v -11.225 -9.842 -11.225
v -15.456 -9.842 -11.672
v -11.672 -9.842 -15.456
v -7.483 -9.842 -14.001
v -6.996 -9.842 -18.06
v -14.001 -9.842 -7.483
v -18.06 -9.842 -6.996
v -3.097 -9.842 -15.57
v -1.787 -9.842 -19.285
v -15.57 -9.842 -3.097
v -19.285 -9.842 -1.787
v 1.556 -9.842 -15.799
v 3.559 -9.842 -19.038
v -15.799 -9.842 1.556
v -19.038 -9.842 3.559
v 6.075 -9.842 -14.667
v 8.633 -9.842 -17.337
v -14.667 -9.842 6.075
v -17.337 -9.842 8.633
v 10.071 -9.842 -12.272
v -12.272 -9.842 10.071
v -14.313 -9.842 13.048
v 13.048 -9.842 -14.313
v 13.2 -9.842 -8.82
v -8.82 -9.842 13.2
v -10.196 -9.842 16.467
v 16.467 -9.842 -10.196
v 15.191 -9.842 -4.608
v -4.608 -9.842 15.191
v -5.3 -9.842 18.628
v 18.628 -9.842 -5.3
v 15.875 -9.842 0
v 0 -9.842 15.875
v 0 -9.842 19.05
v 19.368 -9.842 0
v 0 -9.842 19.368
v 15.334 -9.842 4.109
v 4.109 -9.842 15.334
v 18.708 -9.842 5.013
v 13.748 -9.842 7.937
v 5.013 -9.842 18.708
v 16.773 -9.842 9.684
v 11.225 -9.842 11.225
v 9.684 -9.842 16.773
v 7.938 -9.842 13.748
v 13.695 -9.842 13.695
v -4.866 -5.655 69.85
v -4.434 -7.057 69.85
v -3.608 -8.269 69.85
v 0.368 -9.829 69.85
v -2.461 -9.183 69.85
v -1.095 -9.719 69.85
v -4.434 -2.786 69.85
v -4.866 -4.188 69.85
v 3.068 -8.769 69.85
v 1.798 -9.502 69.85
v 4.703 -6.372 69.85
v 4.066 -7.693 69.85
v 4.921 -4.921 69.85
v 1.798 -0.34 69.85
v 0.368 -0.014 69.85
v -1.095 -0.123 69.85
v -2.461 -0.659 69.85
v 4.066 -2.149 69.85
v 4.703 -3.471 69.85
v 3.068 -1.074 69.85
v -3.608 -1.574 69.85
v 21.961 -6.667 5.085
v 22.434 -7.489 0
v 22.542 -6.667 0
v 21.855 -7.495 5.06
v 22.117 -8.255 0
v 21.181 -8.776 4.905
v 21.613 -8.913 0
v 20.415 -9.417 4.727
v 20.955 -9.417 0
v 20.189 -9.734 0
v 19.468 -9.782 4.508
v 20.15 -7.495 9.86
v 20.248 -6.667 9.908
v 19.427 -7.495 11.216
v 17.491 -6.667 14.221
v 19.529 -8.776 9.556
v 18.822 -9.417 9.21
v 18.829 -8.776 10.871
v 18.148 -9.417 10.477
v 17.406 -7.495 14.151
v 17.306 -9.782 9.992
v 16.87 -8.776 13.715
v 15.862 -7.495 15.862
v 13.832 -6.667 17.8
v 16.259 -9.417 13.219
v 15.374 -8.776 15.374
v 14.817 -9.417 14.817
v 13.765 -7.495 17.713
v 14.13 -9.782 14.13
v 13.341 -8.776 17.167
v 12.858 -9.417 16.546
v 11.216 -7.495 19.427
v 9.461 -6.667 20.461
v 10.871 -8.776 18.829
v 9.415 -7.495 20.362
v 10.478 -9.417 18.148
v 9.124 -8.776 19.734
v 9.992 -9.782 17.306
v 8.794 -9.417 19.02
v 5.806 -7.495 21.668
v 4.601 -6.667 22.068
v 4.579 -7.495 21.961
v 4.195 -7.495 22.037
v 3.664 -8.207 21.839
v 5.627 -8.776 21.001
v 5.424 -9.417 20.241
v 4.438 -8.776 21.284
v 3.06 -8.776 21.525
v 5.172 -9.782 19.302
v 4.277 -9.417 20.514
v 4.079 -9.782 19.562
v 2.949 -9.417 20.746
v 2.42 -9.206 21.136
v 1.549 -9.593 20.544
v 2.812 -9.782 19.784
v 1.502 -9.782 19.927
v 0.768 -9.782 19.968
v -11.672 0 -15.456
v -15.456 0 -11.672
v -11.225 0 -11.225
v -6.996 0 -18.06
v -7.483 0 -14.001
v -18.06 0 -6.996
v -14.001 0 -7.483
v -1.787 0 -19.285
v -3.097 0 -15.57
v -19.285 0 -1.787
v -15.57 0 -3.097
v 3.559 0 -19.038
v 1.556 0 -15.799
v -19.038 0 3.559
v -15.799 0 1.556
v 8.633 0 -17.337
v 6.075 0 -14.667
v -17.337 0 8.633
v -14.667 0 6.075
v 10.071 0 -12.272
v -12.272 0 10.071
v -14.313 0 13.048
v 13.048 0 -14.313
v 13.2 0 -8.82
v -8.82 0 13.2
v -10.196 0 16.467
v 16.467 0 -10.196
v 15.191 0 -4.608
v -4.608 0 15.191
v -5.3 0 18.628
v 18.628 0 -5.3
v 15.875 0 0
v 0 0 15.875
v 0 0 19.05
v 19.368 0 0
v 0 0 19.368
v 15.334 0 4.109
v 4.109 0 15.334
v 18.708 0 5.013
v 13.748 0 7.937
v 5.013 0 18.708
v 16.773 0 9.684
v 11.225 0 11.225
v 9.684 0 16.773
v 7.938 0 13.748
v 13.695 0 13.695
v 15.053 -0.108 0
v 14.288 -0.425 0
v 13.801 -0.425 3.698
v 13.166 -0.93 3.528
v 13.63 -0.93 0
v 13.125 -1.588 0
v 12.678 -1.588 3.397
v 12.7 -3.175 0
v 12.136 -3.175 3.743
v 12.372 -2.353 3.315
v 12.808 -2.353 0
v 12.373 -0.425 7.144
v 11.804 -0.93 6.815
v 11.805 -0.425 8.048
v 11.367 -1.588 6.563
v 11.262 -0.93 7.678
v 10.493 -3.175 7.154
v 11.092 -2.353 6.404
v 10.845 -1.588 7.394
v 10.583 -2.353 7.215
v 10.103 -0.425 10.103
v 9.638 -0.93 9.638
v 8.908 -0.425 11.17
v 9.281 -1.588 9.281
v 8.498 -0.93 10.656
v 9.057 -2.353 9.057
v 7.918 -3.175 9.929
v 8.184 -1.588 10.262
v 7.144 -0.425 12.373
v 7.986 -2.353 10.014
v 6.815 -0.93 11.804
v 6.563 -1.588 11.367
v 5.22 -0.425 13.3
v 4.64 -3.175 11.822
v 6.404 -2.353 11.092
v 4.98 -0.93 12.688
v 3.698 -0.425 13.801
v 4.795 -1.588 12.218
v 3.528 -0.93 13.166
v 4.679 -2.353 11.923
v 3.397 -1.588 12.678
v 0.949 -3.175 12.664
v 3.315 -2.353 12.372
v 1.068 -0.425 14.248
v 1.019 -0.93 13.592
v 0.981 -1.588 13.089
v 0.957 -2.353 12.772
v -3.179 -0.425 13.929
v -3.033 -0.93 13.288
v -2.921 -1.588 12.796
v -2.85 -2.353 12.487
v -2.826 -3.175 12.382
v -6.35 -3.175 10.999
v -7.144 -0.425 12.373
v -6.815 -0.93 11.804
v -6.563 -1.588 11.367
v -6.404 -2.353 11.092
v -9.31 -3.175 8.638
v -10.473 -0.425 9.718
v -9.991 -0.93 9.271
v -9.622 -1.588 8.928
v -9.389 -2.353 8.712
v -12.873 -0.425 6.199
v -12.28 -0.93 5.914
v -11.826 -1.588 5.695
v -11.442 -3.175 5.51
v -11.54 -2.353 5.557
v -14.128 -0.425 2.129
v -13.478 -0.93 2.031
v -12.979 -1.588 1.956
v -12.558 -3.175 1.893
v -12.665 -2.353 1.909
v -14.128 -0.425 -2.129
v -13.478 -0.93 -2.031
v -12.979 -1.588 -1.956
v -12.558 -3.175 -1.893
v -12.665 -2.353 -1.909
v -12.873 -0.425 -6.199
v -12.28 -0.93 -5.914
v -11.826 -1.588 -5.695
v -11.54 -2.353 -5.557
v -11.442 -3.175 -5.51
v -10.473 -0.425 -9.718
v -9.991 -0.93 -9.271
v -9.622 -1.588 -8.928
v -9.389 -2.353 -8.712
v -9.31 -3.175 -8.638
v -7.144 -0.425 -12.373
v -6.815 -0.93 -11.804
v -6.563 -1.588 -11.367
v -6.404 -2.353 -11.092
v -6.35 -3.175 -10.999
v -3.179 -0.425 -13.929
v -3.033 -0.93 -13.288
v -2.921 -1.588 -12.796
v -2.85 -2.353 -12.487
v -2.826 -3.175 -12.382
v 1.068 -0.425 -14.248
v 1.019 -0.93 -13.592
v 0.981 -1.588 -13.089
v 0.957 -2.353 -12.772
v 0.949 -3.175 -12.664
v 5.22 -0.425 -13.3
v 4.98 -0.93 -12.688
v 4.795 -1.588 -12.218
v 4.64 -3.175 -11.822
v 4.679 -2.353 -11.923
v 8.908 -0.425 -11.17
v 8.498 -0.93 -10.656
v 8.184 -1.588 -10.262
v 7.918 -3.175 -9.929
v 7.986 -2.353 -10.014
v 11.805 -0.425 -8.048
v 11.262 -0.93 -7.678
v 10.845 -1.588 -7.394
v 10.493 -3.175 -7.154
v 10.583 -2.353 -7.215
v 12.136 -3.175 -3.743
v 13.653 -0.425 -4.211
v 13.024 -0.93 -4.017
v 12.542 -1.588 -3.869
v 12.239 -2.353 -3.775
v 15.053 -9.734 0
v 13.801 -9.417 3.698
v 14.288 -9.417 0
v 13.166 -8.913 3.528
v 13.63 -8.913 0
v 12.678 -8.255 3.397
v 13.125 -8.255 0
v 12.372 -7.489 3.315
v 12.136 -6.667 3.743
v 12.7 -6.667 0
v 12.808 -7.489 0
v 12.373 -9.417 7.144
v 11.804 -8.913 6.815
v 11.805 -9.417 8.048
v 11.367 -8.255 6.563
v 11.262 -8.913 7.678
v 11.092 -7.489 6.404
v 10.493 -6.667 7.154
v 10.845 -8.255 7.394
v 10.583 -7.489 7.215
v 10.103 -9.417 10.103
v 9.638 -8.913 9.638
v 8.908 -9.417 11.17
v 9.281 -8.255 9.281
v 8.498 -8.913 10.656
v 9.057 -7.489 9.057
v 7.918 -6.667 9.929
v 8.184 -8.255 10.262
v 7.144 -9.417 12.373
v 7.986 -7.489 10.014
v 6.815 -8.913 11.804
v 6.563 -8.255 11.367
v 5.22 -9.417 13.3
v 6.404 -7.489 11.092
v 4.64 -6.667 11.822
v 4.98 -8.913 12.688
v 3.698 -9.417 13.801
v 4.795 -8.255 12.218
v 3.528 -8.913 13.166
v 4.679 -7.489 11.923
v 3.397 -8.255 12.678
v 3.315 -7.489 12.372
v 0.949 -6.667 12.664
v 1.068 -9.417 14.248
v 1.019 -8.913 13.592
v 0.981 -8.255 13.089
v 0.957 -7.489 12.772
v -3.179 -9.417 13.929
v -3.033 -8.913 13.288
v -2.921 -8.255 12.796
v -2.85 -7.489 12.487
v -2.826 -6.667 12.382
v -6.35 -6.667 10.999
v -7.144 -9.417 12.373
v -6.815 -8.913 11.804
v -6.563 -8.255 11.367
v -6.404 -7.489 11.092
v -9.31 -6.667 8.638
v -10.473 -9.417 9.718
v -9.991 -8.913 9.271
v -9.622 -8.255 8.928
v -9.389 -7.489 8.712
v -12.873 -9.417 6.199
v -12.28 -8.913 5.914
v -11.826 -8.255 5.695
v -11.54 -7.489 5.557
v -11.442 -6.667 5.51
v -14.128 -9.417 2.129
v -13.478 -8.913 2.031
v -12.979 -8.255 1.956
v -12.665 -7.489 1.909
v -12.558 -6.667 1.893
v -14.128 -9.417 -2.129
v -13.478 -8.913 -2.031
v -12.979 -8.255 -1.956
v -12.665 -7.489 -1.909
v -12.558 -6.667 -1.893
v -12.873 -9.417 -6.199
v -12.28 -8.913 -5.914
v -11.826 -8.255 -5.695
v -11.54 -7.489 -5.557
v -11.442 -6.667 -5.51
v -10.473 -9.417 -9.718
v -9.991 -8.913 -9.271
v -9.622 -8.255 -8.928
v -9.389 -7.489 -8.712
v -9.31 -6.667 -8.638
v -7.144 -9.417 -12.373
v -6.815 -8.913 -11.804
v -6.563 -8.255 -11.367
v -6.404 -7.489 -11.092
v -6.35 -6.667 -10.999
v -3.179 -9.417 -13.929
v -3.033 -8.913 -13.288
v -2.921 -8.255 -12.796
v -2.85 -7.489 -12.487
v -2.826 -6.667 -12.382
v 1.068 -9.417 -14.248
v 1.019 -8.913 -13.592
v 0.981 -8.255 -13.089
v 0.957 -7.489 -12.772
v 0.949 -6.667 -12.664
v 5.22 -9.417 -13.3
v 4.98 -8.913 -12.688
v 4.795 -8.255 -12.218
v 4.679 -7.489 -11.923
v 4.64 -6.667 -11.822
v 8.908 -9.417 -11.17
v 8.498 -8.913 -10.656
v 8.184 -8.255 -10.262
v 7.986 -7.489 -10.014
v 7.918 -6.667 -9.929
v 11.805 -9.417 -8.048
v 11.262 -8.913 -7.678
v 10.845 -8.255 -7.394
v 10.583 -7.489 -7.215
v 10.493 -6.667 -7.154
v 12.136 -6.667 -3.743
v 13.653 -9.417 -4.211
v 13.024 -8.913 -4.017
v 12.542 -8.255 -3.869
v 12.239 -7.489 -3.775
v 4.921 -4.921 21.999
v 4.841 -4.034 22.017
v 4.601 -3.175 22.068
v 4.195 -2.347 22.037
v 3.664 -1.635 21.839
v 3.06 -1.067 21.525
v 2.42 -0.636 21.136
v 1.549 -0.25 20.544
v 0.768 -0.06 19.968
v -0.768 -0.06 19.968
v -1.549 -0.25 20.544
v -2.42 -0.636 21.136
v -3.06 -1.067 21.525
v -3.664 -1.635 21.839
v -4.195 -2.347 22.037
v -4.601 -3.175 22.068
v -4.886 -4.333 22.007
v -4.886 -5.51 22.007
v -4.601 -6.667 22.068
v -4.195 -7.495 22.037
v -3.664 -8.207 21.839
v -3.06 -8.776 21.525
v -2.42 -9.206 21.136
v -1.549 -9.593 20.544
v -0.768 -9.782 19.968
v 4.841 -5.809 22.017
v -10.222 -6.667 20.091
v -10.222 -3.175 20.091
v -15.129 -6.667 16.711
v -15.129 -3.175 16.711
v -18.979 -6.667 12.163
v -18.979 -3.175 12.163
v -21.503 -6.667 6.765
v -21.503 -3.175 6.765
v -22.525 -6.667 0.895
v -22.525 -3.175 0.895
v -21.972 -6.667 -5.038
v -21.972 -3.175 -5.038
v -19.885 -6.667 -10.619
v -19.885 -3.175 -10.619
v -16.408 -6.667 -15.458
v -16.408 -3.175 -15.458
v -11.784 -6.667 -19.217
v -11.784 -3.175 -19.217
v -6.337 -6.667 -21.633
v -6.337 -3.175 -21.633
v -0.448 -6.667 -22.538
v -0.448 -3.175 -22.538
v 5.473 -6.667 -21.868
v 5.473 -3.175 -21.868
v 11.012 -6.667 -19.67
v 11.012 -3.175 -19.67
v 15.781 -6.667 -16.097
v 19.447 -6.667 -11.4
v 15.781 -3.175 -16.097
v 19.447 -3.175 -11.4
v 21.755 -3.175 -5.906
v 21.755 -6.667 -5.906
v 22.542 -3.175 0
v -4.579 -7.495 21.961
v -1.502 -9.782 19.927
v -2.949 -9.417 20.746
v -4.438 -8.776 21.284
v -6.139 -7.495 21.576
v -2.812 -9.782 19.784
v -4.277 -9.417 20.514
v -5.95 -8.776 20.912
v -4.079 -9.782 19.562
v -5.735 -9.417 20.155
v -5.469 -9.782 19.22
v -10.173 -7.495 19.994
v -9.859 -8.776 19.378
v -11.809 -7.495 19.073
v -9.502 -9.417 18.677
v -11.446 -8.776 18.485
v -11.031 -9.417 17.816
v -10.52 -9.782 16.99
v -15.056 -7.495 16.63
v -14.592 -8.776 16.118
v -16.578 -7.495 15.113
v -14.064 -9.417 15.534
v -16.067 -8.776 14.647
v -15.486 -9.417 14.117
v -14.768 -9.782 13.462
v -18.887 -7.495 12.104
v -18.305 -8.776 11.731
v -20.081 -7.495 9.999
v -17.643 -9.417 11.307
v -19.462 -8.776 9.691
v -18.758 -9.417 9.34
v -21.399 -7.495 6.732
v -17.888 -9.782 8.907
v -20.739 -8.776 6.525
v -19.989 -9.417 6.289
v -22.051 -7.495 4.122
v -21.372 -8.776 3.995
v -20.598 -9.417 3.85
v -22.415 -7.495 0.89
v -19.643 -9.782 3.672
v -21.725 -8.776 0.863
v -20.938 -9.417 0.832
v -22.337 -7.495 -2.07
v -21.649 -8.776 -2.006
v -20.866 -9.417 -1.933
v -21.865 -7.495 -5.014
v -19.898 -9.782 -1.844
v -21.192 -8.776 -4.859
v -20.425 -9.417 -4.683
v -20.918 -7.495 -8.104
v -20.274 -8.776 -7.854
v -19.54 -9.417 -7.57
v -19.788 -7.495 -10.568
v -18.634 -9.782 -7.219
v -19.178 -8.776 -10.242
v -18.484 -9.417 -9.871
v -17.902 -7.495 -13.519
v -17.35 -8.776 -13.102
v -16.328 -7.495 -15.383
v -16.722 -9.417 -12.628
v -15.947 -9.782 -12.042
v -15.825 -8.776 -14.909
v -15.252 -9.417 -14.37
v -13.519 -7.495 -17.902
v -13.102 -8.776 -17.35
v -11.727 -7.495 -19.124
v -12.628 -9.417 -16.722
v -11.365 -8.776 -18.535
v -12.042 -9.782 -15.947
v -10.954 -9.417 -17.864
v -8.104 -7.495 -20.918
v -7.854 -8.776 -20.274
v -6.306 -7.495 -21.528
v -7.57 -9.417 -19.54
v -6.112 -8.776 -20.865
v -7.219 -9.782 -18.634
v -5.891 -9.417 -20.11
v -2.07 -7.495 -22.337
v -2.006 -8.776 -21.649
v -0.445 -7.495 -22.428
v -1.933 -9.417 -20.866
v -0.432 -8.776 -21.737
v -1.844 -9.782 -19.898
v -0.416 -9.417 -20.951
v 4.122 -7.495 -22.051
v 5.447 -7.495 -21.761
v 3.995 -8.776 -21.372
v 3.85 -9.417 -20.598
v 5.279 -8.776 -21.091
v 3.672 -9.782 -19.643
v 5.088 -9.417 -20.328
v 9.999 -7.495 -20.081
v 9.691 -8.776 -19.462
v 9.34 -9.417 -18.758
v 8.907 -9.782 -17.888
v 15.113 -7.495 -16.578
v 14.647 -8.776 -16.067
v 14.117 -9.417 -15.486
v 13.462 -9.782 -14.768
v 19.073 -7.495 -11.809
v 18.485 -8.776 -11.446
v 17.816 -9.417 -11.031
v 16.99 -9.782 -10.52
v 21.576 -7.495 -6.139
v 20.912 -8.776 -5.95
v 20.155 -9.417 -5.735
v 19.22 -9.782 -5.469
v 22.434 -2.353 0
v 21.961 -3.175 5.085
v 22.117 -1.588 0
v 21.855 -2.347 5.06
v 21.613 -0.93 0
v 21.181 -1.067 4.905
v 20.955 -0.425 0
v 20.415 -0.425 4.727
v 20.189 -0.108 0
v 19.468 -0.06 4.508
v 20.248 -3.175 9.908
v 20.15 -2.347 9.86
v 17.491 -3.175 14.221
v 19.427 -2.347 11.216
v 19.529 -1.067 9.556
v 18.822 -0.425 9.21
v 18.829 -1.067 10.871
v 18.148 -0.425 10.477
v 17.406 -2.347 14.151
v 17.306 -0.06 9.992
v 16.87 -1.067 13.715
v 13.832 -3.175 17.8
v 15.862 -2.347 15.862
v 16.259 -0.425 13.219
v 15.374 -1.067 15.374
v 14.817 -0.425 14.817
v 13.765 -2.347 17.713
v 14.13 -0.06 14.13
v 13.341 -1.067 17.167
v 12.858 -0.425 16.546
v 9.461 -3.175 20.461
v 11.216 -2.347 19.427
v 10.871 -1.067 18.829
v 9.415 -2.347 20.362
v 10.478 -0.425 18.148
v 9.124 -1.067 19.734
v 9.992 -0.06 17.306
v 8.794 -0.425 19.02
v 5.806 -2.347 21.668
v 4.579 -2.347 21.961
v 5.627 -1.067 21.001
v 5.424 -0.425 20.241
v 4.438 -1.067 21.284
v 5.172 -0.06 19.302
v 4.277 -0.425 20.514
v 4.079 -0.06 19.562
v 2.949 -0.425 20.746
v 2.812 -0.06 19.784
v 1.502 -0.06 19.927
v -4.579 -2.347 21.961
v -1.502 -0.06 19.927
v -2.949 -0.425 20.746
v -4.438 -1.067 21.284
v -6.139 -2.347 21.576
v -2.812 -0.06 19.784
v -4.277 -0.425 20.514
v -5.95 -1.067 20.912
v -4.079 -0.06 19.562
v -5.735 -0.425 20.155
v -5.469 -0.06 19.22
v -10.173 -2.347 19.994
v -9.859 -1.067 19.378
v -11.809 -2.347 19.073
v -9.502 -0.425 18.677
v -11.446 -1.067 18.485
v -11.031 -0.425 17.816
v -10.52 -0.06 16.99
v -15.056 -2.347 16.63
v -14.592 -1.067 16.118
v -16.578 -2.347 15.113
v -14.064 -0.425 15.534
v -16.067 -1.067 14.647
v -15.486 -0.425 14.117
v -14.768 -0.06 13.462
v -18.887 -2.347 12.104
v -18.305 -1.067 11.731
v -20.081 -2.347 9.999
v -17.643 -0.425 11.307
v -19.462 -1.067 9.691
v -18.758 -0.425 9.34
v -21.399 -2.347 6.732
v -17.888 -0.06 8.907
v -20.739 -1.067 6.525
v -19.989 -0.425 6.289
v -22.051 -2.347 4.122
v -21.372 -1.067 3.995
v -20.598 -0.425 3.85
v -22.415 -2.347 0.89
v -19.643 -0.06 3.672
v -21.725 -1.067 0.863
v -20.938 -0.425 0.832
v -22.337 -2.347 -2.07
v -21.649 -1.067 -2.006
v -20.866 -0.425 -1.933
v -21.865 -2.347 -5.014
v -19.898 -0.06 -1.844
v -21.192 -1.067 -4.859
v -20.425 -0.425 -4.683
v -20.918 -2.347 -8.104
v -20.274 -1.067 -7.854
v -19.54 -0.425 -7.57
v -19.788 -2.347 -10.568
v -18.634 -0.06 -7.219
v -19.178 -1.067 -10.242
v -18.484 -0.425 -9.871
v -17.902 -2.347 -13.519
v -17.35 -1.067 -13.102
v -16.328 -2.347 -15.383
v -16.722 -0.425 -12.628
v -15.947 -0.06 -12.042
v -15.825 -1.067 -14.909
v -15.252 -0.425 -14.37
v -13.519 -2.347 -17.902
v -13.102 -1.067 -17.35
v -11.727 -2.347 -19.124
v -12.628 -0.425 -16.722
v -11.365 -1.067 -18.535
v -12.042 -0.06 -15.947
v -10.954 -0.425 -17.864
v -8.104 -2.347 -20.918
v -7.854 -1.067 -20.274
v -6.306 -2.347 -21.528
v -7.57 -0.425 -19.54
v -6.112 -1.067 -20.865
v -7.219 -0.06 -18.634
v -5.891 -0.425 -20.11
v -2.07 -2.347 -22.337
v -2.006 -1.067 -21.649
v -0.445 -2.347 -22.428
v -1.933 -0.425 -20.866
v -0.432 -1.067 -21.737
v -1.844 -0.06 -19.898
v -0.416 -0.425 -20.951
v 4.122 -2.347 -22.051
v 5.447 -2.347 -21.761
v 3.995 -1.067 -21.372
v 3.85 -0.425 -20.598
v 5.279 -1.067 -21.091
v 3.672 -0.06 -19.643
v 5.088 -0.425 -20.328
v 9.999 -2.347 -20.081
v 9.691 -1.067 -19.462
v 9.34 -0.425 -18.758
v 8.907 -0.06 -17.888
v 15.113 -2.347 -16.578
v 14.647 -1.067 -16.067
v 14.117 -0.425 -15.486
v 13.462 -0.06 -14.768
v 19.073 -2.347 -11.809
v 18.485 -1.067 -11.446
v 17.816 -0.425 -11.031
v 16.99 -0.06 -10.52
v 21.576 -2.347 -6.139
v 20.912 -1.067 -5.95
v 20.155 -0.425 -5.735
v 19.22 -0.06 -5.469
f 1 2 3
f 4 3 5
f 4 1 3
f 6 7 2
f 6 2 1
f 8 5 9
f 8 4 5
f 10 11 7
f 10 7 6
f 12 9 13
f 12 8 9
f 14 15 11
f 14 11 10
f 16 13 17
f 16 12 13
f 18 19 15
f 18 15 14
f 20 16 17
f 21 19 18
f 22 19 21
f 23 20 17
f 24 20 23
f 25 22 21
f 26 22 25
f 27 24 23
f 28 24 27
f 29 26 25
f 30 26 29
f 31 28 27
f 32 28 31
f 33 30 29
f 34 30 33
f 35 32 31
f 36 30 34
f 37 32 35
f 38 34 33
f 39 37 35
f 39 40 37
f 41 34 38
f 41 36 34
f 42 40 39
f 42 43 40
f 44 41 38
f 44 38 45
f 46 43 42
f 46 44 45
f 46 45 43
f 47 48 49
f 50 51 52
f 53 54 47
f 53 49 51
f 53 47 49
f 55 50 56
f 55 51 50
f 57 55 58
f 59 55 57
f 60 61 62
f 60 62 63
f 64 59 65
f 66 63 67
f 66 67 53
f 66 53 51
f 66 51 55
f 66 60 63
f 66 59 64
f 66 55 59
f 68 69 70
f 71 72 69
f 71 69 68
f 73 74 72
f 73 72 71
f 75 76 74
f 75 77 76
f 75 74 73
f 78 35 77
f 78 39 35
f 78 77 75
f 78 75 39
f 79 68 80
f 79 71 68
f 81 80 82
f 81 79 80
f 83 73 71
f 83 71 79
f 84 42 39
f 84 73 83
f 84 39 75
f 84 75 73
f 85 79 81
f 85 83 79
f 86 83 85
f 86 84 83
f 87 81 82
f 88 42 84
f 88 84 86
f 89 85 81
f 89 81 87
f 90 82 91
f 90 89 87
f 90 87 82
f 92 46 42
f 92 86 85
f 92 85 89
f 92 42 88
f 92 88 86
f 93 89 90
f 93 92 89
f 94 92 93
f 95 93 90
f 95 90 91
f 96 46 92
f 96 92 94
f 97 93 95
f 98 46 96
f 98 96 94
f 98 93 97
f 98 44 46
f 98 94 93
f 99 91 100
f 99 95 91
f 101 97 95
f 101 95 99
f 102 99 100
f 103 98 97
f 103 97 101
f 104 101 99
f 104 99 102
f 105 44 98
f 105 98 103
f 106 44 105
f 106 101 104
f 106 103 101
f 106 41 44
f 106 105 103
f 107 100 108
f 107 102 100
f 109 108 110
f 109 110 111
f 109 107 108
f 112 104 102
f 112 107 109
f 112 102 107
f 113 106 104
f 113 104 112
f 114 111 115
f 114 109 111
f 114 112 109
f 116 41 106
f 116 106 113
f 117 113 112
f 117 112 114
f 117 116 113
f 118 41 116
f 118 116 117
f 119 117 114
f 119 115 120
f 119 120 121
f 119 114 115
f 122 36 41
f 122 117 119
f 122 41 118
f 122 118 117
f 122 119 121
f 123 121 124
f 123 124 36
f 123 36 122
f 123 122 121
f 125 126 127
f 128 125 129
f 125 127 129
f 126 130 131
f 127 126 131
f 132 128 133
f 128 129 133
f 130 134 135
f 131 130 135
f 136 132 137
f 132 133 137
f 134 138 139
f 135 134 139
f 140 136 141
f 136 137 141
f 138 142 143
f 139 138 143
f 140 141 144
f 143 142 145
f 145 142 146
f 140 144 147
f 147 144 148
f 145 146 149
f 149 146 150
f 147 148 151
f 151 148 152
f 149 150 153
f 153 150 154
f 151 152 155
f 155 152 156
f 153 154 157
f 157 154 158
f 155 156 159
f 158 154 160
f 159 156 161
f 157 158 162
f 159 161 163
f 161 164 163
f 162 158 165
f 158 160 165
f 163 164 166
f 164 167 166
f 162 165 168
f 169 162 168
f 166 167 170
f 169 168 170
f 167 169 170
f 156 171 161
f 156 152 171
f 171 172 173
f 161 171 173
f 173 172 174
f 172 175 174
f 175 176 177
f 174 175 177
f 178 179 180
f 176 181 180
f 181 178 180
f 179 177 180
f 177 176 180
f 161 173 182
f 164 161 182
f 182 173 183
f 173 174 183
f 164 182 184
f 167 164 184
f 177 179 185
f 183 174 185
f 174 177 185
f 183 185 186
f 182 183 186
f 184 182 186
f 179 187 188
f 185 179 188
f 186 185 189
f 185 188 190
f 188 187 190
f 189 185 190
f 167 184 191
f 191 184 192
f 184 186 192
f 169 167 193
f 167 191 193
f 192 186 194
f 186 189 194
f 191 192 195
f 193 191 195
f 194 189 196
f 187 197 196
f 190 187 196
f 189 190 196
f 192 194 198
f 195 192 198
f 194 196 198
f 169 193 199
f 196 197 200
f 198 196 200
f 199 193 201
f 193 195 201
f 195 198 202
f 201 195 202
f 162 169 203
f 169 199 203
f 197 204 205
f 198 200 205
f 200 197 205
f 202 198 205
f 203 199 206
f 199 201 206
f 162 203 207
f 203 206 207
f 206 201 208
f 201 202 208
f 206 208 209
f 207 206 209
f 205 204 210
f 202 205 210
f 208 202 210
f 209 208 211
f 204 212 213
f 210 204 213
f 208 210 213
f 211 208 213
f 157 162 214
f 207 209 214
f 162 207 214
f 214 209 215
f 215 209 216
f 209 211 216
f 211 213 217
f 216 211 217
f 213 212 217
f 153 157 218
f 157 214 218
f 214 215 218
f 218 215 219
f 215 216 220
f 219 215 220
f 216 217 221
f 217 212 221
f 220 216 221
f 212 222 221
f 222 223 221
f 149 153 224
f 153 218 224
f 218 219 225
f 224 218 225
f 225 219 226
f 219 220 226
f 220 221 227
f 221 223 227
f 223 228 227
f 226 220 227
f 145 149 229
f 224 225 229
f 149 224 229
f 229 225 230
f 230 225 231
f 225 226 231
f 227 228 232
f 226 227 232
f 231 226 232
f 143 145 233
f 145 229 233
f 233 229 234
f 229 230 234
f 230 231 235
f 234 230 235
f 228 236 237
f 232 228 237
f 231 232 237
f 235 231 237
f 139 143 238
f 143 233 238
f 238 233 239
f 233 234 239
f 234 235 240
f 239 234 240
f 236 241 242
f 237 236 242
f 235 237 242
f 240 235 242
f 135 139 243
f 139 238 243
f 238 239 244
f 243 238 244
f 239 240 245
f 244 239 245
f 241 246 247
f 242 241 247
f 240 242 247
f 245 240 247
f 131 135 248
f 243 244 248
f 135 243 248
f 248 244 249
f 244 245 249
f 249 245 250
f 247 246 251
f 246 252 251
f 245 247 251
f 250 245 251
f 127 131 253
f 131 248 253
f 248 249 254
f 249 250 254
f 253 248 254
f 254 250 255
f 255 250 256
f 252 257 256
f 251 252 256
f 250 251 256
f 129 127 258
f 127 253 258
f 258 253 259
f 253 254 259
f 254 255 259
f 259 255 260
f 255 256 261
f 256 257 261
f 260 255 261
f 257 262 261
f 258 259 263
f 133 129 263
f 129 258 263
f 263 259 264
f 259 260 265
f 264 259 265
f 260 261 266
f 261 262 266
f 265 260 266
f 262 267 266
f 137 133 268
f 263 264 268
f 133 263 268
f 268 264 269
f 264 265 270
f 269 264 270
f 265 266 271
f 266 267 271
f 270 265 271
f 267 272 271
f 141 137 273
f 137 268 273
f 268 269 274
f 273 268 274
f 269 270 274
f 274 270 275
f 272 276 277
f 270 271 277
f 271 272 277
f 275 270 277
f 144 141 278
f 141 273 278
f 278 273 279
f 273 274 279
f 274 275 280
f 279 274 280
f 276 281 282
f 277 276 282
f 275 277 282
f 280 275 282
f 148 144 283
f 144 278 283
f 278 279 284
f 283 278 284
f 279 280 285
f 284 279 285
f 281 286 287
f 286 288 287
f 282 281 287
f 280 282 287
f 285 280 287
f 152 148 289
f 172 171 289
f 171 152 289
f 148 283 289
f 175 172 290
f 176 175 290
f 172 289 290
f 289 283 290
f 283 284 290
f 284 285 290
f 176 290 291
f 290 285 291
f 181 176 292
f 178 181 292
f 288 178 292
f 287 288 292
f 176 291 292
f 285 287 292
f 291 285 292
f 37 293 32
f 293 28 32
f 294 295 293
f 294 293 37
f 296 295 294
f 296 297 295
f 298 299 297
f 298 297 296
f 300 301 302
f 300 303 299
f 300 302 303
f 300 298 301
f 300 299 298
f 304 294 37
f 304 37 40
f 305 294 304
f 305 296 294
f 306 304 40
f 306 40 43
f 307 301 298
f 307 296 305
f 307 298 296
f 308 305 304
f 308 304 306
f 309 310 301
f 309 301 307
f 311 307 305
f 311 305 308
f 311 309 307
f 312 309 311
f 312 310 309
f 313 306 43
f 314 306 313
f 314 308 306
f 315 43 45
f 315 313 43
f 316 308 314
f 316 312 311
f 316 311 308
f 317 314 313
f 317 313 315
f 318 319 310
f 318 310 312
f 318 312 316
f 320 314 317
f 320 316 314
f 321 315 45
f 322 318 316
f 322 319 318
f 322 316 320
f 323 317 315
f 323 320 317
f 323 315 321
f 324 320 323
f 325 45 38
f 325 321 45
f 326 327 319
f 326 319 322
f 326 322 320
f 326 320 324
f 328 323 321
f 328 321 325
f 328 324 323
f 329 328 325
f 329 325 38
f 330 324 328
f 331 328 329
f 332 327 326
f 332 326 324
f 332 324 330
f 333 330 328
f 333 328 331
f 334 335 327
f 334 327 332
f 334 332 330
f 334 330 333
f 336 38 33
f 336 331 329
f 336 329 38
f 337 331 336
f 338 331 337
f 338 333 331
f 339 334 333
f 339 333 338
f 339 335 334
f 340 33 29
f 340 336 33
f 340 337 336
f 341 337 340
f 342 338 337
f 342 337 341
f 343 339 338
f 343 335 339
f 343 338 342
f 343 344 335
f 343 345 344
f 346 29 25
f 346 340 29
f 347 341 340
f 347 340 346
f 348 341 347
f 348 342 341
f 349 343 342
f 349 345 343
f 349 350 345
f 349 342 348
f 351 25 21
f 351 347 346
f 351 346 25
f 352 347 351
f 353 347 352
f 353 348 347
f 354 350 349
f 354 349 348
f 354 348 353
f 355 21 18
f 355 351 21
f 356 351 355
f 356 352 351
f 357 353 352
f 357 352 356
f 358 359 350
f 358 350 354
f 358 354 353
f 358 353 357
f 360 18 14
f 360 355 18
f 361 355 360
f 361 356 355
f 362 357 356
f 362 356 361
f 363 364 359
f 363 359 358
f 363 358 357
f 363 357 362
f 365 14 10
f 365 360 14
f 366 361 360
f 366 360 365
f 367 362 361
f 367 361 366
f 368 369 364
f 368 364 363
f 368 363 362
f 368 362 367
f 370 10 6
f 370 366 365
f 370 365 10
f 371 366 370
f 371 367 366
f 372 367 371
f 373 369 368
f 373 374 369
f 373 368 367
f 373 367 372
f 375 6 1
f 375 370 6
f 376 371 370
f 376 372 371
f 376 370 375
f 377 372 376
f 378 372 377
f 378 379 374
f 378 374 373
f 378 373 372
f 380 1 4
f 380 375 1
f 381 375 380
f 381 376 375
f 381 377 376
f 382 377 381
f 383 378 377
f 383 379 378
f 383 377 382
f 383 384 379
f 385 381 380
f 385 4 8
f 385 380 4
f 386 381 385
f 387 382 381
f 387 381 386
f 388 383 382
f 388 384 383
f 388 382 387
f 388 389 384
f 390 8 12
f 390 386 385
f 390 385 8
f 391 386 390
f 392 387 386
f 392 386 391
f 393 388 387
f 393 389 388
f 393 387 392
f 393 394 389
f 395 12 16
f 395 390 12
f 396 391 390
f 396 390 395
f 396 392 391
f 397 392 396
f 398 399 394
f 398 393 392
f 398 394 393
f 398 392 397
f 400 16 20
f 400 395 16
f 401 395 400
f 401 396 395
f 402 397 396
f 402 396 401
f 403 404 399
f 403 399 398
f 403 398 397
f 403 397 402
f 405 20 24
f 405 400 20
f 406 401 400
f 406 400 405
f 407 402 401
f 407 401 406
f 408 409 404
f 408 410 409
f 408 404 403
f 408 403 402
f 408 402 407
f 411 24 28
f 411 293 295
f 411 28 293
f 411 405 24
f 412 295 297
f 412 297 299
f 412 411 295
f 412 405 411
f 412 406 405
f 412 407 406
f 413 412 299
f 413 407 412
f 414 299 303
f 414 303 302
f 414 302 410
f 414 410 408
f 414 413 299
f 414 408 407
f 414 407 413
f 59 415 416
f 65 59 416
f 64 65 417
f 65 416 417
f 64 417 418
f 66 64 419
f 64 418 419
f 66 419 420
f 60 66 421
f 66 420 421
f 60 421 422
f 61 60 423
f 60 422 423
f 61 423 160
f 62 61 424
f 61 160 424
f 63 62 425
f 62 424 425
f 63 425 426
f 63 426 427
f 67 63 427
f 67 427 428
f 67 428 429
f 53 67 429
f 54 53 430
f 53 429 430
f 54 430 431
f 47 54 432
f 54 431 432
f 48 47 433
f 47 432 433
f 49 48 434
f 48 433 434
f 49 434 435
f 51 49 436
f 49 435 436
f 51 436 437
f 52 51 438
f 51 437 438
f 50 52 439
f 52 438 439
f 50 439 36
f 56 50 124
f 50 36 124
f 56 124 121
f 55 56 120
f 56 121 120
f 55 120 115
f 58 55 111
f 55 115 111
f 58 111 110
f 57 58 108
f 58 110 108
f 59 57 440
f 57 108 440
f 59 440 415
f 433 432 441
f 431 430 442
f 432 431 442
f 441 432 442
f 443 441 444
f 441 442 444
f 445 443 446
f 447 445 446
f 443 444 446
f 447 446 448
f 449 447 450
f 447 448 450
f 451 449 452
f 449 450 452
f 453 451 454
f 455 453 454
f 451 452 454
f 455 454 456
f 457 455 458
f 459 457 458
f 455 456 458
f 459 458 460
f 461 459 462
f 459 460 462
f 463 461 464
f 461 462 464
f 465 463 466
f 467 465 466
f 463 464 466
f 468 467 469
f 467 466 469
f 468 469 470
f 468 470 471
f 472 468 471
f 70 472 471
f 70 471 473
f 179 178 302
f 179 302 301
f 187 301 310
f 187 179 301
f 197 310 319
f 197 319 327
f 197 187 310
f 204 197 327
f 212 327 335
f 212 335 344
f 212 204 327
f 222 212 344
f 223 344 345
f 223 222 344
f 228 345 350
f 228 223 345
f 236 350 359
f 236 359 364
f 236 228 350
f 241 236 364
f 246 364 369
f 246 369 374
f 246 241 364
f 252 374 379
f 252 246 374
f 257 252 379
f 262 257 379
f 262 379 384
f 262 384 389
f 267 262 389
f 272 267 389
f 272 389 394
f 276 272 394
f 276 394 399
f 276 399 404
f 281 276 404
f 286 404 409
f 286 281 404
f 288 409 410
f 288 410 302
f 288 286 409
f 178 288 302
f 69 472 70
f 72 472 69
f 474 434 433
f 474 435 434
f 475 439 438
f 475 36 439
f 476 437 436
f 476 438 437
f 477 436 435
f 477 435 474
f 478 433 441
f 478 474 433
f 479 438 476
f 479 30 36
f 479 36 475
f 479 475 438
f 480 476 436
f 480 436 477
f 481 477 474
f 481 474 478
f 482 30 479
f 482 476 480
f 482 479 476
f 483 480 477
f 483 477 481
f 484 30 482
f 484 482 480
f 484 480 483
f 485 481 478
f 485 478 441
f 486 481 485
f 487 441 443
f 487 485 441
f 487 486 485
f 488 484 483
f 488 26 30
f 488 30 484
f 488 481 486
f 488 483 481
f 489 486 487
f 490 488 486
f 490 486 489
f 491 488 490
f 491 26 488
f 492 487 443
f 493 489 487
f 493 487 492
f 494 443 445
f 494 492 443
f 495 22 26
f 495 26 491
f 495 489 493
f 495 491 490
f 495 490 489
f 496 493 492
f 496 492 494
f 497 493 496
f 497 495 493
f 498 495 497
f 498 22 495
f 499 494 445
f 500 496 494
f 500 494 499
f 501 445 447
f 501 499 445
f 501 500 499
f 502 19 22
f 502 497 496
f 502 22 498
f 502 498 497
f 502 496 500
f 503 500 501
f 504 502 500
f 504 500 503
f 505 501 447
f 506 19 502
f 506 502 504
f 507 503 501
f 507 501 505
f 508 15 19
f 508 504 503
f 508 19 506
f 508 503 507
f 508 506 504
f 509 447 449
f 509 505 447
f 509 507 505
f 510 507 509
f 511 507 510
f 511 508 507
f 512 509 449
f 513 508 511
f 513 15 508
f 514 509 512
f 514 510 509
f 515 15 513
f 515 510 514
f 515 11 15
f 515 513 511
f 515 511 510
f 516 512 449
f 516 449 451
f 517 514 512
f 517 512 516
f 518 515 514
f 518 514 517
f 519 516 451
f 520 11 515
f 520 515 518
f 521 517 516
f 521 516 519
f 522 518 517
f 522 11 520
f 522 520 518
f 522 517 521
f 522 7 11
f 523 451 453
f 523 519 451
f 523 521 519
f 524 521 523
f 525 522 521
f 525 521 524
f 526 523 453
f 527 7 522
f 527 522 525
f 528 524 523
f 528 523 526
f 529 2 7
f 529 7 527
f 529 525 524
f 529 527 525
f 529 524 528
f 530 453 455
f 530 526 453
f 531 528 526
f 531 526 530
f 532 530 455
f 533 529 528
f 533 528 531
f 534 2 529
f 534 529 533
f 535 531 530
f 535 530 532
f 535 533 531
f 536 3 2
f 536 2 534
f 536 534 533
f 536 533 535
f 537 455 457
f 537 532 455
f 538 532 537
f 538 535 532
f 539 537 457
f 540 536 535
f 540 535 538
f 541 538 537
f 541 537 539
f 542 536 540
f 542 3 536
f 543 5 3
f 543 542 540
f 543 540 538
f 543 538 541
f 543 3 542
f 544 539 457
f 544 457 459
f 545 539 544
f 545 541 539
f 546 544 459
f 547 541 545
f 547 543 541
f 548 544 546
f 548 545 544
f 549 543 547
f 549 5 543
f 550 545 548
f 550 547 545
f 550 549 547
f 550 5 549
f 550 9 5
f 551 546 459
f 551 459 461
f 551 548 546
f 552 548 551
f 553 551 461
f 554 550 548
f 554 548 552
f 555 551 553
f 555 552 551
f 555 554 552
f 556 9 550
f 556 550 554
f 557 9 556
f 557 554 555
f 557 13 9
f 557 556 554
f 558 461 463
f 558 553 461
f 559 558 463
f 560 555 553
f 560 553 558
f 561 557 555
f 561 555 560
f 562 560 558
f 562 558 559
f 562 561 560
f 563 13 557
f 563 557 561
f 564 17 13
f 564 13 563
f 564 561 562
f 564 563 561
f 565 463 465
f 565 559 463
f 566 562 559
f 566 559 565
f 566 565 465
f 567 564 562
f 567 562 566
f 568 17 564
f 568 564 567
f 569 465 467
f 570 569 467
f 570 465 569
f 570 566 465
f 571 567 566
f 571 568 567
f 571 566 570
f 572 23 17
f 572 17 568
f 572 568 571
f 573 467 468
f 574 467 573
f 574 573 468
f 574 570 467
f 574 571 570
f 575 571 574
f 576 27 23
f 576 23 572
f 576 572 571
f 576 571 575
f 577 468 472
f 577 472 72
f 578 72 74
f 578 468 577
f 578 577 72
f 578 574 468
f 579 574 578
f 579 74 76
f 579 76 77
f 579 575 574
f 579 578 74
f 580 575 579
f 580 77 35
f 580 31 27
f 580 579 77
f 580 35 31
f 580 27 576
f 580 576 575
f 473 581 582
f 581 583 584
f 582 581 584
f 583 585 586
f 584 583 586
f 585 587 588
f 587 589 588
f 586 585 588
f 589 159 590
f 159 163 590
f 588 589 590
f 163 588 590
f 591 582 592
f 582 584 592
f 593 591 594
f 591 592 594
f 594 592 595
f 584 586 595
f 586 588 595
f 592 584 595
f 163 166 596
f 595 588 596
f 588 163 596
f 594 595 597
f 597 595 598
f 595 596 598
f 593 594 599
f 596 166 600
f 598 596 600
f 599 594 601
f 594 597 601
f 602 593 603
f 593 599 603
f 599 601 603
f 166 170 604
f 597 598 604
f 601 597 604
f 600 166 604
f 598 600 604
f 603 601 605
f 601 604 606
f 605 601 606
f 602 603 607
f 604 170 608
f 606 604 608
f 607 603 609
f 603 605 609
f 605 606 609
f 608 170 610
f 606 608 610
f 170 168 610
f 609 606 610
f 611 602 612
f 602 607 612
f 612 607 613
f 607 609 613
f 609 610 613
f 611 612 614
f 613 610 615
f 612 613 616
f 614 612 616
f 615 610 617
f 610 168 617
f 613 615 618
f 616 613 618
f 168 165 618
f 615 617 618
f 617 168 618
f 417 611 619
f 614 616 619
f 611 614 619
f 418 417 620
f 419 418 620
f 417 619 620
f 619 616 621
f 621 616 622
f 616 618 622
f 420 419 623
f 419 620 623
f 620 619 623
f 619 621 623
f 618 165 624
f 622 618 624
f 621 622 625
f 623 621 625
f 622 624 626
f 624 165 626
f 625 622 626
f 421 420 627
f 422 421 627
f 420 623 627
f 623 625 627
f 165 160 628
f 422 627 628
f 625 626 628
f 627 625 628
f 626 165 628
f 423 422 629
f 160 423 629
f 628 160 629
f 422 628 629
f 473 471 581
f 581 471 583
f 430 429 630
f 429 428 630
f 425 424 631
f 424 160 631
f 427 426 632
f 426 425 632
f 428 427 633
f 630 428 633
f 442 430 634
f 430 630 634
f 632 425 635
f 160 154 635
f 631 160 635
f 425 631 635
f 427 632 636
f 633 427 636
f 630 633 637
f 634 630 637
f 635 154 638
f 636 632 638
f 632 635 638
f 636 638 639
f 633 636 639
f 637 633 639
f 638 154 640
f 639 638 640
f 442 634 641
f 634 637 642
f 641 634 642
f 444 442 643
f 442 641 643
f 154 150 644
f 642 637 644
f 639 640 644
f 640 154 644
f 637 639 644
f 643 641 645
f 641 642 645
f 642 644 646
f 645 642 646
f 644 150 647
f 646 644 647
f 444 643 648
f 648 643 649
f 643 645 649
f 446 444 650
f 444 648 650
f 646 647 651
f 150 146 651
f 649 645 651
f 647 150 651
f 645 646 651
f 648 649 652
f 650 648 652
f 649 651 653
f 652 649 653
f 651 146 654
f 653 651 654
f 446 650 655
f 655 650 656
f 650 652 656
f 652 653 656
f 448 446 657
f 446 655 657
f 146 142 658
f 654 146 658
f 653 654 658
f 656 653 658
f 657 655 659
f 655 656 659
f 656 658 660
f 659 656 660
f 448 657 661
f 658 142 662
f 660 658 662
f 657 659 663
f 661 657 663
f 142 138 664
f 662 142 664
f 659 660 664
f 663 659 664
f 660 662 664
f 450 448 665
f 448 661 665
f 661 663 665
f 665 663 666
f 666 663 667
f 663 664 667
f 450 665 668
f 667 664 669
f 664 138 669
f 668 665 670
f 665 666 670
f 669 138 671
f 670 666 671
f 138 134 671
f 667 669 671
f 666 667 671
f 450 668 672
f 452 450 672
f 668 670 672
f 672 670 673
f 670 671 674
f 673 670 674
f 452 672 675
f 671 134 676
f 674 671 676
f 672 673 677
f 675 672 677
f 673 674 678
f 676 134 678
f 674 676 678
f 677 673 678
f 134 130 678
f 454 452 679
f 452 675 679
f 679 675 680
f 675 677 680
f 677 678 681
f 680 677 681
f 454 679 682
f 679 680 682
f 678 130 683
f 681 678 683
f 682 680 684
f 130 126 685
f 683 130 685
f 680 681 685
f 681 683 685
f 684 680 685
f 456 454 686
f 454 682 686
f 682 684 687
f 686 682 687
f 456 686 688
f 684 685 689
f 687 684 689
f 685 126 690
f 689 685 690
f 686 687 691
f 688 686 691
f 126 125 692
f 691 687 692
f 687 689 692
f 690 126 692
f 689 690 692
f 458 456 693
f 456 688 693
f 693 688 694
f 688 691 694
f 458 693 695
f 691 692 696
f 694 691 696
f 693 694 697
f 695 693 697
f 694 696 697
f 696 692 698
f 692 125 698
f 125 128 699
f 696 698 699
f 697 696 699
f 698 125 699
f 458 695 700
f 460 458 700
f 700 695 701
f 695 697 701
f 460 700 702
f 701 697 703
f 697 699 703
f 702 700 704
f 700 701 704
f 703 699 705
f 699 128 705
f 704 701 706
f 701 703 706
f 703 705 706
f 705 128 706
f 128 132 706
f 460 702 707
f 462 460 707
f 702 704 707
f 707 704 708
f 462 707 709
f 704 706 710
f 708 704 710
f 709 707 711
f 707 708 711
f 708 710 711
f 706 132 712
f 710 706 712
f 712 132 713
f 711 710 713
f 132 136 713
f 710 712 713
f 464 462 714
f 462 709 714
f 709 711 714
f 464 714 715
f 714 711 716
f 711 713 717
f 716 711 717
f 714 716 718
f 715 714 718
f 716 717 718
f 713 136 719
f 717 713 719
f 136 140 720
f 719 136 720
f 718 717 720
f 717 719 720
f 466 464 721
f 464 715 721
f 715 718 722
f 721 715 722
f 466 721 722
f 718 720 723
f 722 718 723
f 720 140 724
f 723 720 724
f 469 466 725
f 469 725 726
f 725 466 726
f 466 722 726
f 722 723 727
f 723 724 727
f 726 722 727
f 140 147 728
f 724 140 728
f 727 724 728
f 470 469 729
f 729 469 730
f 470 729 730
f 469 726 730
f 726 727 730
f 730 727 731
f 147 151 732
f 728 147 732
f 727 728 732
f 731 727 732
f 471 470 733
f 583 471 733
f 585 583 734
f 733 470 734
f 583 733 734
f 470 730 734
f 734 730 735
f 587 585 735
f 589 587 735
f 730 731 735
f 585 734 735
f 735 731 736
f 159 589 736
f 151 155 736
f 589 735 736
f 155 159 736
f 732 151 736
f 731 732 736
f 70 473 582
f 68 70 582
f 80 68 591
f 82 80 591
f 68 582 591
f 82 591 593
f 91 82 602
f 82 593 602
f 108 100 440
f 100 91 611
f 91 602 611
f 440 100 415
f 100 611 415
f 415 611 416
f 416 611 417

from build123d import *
from build123d import SkipClean  # not in build123d's __all__

# Parameters (mm, degrees)
F0_R          = 22.5425
F0_R_2        = 12.7
F1_DEPTH      = 9.8425
F2_R          = 3.175
F3_R          = 3.175
F5_R          = 4.92125
F6_DEPTH      = 50.8
F6_DEPTH_BACK = 3.175


with BuildPart() as f1:
    # F0 (on Front) → F1 (new body)
    with BuildSketch(Plane.XZ):
        Circle(F0_R)
        Circle(F0_R_2, mode=Mode.SUBTRACT)
    extrude(amount=F1_DEPTH)

    # F2
    f2_edges = [f1.edges().sort_by_distance(p)[0] for p in [
        (-22.5425, -9.8425, 0),
        (-22.5425, 0, 0),
    ]]
    fillet(f2_edges, radius=F2_R)

    # F3
    f3_edges = [f1.edges().sort_by_distance(p)[0] for p in [
        (-12.7, -9.8425, 0),
        (-12.7, 0, 0),
    ]]
    fillet(f3_edges, radius=F3_R)

    # F5 (on offset) → F6 (join, two sides)
    with BuildSketch(Plane.XY.offset(19.05)) as f6_sk:
        with Locations((0, -4.92125)):
            Circle(F5_R)
    with SkipClean():  # cleaning this boolean's faces spoils the solid; the shape is the same uncleaned
        extrude(amount=F6_DEPTH)
        extrude(f6_sk.sketch, amount=-F6_DEPTH_BACK)


solid = f1.part
